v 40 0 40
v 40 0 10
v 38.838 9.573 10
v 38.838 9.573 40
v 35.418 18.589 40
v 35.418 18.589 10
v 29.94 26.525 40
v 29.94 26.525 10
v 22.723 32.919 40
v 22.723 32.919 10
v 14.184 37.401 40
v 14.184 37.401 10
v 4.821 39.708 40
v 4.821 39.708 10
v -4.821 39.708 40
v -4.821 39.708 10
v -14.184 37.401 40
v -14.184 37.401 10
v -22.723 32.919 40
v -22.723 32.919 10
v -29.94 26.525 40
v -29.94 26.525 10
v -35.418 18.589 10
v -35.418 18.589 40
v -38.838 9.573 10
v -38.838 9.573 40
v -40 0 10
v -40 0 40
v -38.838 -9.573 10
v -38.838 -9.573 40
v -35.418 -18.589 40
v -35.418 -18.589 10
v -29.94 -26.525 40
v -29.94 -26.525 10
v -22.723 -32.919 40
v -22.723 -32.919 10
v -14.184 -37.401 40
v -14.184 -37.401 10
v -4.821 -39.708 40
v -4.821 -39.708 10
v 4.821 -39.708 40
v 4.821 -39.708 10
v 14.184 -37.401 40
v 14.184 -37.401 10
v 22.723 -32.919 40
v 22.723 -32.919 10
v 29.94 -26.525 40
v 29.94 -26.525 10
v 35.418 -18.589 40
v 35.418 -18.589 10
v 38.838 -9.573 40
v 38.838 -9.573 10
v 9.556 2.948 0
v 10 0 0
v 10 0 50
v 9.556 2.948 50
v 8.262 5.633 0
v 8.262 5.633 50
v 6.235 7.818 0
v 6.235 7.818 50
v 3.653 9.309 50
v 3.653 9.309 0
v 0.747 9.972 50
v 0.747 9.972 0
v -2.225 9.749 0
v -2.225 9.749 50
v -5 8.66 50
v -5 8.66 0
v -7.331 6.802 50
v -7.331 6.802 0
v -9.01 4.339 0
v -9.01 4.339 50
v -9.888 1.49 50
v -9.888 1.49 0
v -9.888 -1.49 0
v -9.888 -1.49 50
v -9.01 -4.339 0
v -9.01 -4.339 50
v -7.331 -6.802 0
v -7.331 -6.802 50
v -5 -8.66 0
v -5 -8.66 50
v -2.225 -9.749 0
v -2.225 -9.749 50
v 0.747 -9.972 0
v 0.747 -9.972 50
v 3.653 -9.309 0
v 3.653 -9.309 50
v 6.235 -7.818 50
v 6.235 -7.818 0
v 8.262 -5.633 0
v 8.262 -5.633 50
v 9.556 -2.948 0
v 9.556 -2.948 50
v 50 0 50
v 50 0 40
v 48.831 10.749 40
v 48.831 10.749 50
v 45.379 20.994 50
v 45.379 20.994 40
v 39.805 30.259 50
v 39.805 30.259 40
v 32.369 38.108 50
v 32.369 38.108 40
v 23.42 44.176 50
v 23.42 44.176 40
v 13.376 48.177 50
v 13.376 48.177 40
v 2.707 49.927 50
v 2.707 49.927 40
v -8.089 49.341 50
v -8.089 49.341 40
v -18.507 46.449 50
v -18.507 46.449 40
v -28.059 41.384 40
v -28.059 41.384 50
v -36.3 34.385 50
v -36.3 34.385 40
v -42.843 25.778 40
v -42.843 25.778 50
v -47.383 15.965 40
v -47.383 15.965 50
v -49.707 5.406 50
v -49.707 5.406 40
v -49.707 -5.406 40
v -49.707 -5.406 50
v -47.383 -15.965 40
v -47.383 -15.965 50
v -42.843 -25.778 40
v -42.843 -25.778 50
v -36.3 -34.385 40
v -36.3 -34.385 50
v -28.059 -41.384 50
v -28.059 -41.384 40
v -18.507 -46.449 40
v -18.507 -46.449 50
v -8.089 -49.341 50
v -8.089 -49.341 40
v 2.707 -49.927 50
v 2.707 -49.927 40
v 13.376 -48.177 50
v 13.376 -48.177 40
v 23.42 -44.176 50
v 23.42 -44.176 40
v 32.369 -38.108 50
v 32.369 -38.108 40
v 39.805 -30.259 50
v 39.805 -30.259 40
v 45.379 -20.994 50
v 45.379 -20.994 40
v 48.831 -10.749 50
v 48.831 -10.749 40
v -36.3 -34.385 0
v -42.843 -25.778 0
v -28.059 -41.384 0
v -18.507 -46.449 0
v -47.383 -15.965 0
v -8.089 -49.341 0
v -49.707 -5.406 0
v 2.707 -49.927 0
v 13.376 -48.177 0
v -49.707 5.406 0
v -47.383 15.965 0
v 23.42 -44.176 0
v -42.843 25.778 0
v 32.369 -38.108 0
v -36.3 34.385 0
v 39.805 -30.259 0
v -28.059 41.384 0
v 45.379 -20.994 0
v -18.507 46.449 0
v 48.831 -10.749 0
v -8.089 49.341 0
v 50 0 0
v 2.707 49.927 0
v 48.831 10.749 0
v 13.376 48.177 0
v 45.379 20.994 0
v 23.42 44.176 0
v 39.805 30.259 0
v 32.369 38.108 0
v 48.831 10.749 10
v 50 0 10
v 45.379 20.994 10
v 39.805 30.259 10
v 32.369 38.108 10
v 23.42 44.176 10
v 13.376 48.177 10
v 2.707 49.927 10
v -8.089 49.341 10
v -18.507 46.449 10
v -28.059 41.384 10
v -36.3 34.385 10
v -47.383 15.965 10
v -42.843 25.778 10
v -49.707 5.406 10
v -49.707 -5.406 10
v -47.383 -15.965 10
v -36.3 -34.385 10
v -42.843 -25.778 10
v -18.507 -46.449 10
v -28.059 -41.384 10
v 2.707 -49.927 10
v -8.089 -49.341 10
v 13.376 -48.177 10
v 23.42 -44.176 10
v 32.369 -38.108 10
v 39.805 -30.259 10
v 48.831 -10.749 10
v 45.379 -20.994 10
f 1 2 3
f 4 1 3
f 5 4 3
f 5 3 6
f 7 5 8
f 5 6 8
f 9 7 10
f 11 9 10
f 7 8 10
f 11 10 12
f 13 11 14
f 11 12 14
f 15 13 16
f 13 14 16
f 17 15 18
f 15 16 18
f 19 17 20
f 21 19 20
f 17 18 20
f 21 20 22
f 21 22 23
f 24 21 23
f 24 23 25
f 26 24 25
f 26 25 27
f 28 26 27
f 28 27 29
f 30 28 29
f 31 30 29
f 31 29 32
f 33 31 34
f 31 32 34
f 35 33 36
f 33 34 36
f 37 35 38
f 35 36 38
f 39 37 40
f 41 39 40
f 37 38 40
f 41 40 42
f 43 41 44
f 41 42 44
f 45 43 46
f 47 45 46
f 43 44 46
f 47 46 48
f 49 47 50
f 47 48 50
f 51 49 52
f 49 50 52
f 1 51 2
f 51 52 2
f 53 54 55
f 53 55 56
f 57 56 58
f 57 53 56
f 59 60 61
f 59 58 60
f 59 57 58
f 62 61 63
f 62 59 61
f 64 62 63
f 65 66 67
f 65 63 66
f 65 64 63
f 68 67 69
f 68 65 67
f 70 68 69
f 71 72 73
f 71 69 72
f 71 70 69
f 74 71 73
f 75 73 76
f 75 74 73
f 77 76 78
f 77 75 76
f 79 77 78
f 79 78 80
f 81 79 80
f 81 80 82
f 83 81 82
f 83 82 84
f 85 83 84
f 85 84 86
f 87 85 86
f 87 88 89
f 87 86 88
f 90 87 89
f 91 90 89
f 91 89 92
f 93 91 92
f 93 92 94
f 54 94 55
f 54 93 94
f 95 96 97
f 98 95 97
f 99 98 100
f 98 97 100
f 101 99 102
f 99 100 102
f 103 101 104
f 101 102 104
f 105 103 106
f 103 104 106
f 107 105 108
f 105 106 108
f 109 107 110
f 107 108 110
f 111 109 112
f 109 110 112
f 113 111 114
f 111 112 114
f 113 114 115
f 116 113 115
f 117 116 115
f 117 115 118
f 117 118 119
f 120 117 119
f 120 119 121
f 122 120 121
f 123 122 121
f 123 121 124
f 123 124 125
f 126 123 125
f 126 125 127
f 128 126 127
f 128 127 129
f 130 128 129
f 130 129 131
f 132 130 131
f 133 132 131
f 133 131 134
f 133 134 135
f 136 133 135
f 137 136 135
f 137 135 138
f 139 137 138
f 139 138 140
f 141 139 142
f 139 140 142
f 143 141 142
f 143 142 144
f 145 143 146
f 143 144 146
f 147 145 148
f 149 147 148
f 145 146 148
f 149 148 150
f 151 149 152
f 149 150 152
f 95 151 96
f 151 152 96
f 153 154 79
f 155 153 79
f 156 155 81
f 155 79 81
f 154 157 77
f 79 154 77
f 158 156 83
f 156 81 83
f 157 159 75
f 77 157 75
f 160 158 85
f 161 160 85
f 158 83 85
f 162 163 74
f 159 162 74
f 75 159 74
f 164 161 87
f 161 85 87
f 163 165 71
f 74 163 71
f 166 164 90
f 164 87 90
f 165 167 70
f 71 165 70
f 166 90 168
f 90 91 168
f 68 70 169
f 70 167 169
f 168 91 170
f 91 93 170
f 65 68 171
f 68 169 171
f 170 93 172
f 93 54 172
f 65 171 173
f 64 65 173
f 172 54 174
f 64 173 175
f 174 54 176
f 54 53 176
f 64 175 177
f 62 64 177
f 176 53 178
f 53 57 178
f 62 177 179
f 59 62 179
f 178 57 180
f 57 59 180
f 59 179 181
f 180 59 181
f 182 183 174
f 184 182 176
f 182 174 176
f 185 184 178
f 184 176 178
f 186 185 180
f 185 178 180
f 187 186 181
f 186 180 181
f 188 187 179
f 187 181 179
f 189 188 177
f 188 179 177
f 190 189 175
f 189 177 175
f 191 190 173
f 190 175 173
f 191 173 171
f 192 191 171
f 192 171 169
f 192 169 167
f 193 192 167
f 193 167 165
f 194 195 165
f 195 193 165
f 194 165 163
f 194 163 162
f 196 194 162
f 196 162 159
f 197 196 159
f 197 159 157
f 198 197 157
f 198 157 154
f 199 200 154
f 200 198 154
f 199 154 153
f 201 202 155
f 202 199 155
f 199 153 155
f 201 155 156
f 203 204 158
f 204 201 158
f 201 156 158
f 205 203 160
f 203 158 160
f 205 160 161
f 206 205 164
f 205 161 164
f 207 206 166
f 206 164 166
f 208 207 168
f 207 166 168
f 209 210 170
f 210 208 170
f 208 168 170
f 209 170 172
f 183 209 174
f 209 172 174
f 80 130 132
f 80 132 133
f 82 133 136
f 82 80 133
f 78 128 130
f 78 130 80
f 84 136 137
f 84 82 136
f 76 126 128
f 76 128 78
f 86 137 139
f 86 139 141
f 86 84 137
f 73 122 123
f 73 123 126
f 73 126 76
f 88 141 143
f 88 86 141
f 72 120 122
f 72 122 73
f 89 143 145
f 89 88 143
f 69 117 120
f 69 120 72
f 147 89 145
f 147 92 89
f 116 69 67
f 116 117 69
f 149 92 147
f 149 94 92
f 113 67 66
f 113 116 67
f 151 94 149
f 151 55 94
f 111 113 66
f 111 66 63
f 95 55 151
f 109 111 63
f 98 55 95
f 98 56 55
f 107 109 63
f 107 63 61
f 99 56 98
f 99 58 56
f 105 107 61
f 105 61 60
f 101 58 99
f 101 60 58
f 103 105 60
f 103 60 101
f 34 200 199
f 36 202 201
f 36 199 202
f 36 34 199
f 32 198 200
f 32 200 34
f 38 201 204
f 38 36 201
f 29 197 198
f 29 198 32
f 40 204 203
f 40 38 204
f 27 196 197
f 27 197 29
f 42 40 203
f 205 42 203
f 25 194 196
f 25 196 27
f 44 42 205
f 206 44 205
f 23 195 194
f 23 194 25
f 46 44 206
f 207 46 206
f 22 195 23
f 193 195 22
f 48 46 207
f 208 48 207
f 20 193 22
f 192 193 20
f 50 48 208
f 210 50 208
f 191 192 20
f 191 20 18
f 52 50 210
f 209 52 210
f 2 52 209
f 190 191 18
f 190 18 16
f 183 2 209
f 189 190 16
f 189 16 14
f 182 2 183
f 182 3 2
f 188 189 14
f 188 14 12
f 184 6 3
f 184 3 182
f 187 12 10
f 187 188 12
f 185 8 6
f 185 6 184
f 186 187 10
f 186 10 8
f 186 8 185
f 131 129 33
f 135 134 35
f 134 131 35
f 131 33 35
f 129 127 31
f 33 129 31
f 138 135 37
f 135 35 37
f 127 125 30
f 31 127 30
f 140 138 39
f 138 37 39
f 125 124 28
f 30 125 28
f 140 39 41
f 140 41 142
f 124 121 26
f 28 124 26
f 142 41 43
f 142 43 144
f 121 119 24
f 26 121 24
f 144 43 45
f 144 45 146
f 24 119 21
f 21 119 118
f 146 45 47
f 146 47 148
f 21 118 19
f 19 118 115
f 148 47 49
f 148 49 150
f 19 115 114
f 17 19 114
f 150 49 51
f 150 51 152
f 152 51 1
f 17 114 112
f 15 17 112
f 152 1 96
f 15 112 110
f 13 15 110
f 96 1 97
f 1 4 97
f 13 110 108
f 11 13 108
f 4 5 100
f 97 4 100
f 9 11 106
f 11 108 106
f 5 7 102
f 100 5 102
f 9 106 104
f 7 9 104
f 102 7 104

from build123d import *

# Parameters (mm, degrees)
SKETCH_1_R               = 50
EXTRUDE_1_DEPTH          = 50
CUT_EXTRUDE_1_DEPTH      = 15
CUT_EXTRUDE_1_DEPTH_BACK = 15
SKETCH_2_OUTSIDE_W       = 132
SKETCH_2_OUTSIDE_H       = 132
SKETCH_2_OUTSIDE_R       = 40
CUT_EXTRUDE_2_DEPTH      = 76
CUT_EXTRUDE_2_DEPTH_BACK = 76
SKETCH_3_R               = 10


with BuildPart() as part:
    # 草图1 → 凸台-拉伸1 (new body)
    with BuildSketch(Plane.XY):
        Circle(SKETCH_1_R)
    extrude(amount=EXTRUDE_1_DEPTH)

    # 草图2 outside → 切除-拉伸1 (cut, two sides: drawn at the far end of the back side and taken through both)
    with BuildSketch(Plane.XY.offset(25).offset(-CUT_EXTRUDE_1_DEPTH_BACK)):
        Rectangle(SKETCH_2_OUTSIDE_W, SKETCH_2_OUTSIDE_H)
        Circle(SKETCH_2_OUTSIDE_R, mode=Mode.SUBTRACT)
    extrude(amount=CUT_EXTRUDE_1_DEPTH + CUT_EXTRUDE_1_DEPTH_BACK, mode=Mode.SUBTRACT)

    # 草图3 → 切除-拉伸2 (cut, two sides: drawn at the far end of the back side and taken through both)
    with BuildSketch(Plane.XY.offset(25).offset(-CUT_EXTRUDE_2_DEPTH_BACK)):
        Circle(SKETCH_3_R)
    extrude(amount=CUT_EXTRUDE_2_DEPTH + CUT_EXTRUDE_2_DEPTH_BACK, mode=Mode.SUBTRACT)


solid = part.part
